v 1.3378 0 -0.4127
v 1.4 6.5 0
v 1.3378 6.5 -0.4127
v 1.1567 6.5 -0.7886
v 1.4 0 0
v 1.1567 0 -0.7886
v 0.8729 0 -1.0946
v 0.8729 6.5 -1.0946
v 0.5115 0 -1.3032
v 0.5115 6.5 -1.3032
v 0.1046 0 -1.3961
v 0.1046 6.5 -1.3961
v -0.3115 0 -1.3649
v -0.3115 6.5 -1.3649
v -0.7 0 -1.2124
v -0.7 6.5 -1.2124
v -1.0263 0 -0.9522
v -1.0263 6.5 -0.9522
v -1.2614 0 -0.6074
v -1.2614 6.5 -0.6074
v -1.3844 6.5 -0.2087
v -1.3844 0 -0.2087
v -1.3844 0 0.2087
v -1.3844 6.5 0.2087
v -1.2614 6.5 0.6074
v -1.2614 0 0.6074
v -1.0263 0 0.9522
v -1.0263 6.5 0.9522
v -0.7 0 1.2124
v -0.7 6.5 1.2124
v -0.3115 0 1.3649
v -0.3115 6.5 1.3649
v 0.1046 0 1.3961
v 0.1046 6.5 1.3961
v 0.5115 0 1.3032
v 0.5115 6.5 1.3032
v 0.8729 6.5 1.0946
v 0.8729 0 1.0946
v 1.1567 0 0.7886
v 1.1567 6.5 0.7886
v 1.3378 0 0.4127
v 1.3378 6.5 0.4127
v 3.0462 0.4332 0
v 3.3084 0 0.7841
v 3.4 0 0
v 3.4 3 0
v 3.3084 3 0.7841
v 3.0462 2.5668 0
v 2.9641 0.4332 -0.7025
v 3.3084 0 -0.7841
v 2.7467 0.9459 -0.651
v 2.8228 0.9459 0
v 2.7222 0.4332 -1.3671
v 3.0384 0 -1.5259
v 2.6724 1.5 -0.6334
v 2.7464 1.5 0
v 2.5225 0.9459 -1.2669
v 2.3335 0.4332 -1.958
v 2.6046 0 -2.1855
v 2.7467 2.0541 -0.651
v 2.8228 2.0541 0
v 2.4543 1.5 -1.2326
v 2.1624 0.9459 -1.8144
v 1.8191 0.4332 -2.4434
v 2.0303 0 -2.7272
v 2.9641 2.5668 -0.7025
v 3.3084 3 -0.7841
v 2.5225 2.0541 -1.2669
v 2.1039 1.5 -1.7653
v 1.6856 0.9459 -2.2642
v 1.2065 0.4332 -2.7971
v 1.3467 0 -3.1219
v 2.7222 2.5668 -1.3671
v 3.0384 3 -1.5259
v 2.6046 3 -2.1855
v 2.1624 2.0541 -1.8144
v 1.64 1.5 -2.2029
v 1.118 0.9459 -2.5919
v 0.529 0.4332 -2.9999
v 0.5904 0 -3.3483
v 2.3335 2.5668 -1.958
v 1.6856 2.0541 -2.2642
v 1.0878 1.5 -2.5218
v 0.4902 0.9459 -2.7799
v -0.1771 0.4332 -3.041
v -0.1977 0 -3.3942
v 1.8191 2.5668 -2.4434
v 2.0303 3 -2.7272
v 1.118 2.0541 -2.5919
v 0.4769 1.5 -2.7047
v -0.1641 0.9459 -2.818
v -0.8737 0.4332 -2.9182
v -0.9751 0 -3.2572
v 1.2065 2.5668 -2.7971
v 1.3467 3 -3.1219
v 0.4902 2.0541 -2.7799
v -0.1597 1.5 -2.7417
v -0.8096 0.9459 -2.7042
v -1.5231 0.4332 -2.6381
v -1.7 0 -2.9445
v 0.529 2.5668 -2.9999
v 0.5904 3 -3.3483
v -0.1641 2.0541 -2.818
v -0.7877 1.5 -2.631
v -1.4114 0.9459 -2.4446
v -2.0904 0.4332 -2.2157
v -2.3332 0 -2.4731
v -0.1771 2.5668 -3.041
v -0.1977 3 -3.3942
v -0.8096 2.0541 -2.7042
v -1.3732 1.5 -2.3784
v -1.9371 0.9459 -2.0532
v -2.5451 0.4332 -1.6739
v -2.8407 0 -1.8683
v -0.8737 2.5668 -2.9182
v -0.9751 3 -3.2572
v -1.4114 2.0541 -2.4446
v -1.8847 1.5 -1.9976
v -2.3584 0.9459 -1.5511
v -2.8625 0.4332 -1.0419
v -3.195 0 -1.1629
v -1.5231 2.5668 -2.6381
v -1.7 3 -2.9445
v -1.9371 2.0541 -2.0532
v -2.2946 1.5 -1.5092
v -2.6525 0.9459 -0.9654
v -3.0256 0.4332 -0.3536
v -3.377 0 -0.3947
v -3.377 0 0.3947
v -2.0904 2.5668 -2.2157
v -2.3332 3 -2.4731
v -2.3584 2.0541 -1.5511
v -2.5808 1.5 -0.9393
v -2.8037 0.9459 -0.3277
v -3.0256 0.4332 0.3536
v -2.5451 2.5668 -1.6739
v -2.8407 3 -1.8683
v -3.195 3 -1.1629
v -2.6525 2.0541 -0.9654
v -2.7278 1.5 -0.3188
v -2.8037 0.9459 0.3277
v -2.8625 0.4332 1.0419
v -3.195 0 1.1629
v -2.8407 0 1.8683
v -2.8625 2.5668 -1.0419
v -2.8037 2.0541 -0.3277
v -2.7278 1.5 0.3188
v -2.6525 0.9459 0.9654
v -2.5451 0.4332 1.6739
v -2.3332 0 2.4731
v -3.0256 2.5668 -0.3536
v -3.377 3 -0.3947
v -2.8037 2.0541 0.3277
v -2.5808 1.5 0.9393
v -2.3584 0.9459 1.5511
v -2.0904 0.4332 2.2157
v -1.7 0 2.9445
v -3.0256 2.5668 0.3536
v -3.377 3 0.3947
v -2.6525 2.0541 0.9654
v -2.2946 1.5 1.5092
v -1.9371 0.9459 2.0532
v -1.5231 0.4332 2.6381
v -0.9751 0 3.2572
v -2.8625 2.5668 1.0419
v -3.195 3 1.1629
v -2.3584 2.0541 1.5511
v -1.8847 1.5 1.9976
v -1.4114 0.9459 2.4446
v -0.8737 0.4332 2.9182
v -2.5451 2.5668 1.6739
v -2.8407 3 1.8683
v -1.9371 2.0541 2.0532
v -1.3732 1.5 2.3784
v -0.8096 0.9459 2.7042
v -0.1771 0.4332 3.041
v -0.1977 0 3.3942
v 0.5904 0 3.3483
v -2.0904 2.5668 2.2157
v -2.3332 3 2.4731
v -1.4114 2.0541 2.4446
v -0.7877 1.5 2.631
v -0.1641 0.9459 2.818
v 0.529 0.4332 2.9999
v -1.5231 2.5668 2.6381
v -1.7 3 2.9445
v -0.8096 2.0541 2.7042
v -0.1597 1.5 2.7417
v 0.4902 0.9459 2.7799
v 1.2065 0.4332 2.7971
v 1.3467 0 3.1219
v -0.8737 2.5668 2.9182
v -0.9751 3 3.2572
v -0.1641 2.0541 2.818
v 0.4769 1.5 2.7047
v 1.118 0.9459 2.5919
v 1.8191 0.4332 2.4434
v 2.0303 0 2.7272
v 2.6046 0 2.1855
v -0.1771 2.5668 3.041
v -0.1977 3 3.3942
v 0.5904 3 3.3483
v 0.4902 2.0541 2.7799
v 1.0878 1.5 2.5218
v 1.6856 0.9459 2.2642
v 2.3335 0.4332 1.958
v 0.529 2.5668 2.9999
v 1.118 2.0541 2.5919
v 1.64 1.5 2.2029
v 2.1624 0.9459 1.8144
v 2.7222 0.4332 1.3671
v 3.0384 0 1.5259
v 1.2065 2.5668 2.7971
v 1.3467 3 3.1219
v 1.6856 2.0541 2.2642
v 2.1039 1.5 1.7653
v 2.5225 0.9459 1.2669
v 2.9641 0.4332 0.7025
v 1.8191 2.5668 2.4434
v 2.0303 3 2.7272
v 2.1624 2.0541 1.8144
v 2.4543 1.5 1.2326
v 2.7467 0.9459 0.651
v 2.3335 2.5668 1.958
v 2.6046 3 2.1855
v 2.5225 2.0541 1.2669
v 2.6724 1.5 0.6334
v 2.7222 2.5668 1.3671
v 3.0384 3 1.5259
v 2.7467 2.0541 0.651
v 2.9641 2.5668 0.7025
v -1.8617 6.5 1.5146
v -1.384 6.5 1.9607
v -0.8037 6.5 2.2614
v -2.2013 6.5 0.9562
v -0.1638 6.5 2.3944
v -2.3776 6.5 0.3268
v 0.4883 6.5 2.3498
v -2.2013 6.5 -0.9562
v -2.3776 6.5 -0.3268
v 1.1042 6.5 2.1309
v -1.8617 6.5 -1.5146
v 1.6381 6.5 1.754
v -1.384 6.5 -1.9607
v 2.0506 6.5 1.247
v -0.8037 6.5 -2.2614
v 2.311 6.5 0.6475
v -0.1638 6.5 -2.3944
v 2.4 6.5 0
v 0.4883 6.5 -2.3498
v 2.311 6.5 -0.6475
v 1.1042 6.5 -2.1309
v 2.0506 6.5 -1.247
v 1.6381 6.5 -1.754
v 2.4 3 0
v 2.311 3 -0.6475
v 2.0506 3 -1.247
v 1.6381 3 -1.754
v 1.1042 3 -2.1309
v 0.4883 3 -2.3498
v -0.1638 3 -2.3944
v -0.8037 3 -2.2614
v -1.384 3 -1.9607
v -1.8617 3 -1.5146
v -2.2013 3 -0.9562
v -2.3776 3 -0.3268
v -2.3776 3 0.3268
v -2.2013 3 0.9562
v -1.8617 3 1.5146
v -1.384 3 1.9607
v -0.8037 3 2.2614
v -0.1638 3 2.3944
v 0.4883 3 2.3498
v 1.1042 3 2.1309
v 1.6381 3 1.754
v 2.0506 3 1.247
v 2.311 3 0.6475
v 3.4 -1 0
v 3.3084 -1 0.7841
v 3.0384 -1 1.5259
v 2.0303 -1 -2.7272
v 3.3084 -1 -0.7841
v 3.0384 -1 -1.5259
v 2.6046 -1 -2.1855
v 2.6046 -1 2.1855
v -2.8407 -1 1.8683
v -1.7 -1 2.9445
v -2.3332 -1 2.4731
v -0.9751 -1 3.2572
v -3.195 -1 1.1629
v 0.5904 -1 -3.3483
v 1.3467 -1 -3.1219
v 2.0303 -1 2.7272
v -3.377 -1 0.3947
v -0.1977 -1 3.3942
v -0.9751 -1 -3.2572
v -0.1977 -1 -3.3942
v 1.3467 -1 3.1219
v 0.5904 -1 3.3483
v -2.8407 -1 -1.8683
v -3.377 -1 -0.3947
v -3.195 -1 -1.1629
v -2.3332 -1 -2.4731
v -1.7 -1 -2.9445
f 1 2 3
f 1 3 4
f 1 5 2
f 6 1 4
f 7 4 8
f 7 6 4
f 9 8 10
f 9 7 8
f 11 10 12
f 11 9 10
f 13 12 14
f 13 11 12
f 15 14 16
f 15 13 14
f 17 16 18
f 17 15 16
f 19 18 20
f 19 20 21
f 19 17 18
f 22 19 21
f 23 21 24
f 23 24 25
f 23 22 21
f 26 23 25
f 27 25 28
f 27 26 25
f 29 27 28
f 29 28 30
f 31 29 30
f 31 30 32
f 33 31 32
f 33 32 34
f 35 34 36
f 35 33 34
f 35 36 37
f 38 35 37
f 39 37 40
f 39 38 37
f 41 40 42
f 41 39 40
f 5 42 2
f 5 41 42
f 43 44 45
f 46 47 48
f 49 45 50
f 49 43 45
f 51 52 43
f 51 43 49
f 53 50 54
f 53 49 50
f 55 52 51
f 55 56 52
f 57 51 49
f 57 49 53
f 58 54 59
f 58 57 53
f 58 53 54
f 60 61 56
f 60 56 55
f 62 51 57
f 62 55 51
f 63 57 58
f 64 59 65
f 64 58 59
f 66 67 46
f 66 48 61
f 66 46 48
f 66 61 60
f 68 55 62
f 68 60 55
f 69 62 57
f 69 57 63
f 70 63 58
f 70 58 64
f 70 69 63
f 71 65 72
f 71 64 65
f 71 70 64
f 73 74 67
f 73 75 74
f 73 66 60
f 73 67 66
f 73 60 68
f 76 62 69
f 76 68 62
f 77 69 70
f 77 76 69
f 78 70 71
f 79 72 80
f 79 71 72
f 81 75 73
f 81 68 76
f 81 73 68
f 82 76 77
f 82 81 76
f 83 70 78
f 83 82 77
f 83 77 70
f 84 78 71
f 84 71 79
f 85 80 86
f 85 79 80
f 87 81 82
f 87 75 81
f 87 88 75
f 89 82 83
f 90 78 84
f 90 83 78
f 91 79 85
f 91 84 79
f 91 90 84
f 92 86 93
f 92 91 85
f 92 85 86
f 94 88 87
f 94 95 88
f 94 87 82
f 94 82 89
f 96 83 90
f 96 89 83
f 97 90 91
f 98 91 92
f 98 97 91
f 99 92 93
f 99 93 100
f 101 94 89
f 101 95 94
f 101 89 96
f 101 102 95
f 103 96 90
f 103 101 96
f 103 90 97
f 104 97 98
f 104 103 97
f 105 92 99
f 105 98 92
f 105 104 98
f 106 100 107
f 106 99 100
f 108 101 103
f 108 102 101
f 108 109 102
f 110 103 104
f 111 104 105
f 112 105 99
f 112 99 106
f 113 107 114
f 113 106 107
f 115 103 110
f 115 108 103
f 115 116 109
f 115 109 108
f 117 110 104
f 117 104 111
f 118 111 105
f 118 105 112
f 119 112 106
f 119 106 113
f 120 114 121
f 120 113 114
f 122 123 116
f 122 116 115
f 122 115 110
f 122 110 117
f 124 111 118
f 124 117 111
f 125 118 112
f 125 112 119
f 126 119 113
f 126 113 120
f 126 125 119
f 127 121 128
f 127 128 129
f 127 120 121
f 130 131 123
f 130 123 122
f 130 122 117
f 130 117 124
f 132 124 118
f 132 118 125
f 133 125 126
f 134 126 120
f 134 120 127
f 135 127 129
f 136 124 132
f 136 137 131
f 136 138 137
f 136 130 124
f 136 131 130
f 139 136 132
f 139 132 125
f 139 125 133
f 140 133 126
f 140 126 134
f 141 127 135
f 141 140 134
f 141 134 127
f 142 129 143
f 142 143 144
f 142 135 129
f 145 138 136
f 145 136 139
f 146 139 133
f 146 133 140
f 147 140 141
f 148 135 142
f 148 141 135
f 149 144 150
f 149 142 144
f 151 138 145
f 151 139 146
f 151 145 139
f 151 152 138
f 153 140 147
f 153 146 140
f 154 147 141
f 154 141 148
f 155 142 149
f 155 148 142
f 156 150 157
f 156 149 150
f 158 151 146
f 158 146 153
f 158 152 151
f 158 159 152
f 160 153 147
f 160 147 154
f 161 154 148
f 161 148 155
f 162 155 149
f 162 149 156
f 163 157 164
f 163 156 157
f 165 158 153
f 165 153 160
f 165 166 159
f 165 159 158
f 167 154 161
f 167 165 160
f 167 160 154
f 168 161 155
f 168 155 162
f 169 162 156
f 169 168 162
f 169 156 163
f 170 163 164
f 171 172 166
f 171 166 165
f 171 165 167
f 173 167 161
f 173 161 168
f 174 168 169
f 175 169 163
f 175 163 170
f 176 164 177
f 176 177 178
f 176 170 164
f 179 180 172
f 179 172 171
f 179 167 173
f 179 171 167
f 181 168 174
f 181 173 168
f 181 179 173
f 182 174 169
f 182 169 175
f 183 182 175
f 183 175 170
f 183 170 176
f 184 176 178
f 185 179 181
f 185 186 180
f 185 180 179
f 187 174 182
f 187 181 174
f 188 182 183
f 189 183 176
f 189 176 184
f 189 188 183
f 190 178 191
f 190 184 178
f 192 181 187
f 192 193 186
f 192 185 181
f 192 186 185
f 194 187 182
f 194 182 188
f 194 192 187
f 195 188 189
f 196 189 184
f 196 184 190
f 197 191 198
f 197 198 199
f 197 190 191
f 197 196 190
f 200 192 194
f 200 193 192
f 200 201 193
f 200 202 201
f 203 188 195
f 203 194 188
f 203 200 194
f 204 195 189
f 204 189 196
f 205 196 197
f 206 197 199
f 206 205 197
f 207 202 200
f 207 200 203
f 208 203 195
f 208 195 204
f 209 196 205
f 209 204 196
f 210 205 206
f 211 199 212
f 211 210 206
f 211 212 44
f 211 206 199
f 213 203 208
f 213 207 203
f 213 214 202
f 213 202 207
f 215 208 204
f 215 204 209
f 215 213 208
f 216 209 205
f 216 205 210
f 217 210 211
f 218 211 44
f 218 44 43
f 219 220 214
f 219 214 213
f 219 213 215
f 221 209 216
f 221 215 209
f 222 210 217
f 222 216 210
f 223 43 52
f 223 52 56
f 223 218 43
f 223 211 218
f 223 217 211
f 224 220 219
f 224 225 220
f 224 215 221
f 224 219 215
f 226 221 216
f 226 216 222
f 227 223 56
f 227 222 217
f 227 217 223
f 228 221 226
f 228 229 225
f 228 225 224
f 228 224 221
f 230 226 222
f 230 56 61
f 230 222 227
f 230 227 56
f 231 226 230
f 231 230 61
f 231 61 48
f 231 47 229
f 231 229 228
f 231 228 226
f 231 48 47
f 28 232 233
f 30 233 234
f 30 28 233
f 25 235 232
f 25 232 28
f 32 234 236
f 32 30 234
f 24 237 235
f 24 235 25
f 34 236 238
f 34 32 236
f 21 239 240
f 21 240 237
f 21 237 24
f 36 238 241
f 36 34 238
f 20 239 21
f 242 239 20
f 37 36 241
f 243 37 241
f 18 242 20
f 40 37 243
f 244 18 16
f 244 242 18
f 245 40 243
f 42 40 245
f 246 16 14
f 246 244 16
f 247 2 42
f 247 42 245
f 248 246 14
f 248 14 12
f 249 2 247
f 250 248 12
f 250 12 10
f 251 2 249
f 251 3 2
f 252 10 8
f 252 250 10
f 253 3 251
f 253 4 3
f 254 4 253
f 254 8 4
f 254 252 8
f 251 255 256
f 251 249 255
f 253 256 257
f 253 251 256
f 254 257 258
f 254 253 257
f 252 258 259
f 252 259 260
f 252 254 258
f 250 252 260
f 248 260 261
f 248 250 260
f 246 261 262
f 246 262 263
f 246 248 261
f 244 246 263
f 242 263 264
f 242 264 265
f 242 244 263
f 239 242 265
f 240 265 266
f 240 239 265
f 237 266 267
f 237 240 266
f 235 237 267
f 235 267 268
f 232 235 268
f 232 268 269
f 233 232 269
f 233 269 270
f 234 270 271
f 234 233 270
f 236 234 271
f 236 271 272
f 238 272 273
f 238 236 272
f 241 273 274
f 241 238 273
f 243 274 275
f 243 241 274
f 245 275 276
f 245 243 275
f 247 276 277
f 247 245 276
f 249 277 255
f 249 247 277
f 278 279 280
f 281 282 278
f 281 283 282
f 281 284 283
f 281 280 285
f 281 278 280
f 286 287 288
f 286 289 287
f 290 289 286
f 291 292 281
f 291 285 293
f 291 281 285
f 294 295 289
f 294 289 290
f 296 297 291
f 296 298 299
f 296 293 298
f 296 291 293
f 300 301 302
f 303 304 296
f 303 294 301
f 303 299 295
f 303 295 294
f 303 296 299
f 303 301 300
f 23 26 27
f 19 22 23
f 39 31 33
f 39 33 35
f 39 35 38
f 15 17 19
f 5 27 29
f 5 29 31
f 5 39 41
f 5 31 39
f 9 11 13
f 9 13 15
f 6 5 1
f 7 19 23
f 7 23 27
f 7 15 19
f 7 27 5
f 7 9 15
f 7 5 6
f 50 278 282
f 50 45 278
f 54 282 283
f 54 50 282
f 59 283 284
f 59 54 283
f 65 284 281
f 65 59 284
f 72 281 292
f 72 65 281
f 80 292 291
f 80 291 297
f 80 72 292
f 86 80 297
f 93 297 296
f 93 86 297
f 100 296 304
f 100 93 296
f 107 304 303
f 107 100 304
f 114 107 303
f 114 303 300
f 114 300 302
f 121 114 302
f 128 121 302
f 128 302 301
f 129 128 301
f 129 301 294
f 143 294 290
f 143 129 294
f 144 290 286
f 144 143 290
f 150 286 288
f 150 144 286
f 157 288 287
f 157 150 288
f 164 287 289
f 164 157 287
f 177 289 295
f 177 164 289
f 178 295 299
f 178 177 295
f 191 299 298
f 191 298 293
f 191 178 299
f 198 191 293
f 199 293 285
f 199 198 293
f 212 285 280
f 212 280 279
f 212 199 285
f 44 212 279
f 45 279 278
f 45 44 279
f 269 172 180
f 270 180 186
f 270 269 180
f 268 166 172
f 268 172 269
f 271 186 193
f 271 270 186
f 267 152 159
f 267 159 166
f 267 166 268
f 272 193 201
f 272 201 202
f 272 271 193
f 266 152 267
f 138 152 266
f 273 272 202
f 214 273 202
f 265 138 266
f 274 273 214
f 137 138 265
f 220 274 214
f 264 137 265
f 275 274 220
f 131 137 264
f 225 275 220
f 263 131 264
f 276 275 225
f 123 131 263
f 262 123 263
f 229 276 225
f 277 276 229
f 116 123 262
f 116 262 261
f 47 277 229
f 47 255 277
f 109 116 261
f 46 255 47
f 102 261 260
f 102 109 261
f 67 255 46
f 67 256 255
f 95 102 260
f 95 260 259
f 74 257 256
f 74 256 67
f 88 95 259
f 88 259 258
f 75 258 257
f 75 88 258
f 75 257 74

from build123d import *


with BuildPart() as f1:
    # F0 (on Top) → F1 (revolve)
    with BuildSketch(Plane.XY):
        Polygon((1.4, 6.5), (1.4, 0), (2.4, 0), (2.4, 3), (2.4, 6.5), align=None)
        Polygon((2.4, 0), (1.4, 0), (0, 0), (0, -1), (3.4, -1), (3.4, 0), (2.428727, 0), align=None)
        with BuildLine():
            Line((2.4, 3), (2.4, 0))
            Line((2.4, 0), (2.428727, 0))
            Line((2.428727, 0), (3.4, 0))
            ThreePointArc((3.4, 0), (2.746383, 1.5), (3.4, 3))
            Line((3.4, 3), (2.4, 3))
        make_face()
    revolve(axis=Axis((0, 7.587805, 0), (0, 1, 0)))


solid = f1.part
